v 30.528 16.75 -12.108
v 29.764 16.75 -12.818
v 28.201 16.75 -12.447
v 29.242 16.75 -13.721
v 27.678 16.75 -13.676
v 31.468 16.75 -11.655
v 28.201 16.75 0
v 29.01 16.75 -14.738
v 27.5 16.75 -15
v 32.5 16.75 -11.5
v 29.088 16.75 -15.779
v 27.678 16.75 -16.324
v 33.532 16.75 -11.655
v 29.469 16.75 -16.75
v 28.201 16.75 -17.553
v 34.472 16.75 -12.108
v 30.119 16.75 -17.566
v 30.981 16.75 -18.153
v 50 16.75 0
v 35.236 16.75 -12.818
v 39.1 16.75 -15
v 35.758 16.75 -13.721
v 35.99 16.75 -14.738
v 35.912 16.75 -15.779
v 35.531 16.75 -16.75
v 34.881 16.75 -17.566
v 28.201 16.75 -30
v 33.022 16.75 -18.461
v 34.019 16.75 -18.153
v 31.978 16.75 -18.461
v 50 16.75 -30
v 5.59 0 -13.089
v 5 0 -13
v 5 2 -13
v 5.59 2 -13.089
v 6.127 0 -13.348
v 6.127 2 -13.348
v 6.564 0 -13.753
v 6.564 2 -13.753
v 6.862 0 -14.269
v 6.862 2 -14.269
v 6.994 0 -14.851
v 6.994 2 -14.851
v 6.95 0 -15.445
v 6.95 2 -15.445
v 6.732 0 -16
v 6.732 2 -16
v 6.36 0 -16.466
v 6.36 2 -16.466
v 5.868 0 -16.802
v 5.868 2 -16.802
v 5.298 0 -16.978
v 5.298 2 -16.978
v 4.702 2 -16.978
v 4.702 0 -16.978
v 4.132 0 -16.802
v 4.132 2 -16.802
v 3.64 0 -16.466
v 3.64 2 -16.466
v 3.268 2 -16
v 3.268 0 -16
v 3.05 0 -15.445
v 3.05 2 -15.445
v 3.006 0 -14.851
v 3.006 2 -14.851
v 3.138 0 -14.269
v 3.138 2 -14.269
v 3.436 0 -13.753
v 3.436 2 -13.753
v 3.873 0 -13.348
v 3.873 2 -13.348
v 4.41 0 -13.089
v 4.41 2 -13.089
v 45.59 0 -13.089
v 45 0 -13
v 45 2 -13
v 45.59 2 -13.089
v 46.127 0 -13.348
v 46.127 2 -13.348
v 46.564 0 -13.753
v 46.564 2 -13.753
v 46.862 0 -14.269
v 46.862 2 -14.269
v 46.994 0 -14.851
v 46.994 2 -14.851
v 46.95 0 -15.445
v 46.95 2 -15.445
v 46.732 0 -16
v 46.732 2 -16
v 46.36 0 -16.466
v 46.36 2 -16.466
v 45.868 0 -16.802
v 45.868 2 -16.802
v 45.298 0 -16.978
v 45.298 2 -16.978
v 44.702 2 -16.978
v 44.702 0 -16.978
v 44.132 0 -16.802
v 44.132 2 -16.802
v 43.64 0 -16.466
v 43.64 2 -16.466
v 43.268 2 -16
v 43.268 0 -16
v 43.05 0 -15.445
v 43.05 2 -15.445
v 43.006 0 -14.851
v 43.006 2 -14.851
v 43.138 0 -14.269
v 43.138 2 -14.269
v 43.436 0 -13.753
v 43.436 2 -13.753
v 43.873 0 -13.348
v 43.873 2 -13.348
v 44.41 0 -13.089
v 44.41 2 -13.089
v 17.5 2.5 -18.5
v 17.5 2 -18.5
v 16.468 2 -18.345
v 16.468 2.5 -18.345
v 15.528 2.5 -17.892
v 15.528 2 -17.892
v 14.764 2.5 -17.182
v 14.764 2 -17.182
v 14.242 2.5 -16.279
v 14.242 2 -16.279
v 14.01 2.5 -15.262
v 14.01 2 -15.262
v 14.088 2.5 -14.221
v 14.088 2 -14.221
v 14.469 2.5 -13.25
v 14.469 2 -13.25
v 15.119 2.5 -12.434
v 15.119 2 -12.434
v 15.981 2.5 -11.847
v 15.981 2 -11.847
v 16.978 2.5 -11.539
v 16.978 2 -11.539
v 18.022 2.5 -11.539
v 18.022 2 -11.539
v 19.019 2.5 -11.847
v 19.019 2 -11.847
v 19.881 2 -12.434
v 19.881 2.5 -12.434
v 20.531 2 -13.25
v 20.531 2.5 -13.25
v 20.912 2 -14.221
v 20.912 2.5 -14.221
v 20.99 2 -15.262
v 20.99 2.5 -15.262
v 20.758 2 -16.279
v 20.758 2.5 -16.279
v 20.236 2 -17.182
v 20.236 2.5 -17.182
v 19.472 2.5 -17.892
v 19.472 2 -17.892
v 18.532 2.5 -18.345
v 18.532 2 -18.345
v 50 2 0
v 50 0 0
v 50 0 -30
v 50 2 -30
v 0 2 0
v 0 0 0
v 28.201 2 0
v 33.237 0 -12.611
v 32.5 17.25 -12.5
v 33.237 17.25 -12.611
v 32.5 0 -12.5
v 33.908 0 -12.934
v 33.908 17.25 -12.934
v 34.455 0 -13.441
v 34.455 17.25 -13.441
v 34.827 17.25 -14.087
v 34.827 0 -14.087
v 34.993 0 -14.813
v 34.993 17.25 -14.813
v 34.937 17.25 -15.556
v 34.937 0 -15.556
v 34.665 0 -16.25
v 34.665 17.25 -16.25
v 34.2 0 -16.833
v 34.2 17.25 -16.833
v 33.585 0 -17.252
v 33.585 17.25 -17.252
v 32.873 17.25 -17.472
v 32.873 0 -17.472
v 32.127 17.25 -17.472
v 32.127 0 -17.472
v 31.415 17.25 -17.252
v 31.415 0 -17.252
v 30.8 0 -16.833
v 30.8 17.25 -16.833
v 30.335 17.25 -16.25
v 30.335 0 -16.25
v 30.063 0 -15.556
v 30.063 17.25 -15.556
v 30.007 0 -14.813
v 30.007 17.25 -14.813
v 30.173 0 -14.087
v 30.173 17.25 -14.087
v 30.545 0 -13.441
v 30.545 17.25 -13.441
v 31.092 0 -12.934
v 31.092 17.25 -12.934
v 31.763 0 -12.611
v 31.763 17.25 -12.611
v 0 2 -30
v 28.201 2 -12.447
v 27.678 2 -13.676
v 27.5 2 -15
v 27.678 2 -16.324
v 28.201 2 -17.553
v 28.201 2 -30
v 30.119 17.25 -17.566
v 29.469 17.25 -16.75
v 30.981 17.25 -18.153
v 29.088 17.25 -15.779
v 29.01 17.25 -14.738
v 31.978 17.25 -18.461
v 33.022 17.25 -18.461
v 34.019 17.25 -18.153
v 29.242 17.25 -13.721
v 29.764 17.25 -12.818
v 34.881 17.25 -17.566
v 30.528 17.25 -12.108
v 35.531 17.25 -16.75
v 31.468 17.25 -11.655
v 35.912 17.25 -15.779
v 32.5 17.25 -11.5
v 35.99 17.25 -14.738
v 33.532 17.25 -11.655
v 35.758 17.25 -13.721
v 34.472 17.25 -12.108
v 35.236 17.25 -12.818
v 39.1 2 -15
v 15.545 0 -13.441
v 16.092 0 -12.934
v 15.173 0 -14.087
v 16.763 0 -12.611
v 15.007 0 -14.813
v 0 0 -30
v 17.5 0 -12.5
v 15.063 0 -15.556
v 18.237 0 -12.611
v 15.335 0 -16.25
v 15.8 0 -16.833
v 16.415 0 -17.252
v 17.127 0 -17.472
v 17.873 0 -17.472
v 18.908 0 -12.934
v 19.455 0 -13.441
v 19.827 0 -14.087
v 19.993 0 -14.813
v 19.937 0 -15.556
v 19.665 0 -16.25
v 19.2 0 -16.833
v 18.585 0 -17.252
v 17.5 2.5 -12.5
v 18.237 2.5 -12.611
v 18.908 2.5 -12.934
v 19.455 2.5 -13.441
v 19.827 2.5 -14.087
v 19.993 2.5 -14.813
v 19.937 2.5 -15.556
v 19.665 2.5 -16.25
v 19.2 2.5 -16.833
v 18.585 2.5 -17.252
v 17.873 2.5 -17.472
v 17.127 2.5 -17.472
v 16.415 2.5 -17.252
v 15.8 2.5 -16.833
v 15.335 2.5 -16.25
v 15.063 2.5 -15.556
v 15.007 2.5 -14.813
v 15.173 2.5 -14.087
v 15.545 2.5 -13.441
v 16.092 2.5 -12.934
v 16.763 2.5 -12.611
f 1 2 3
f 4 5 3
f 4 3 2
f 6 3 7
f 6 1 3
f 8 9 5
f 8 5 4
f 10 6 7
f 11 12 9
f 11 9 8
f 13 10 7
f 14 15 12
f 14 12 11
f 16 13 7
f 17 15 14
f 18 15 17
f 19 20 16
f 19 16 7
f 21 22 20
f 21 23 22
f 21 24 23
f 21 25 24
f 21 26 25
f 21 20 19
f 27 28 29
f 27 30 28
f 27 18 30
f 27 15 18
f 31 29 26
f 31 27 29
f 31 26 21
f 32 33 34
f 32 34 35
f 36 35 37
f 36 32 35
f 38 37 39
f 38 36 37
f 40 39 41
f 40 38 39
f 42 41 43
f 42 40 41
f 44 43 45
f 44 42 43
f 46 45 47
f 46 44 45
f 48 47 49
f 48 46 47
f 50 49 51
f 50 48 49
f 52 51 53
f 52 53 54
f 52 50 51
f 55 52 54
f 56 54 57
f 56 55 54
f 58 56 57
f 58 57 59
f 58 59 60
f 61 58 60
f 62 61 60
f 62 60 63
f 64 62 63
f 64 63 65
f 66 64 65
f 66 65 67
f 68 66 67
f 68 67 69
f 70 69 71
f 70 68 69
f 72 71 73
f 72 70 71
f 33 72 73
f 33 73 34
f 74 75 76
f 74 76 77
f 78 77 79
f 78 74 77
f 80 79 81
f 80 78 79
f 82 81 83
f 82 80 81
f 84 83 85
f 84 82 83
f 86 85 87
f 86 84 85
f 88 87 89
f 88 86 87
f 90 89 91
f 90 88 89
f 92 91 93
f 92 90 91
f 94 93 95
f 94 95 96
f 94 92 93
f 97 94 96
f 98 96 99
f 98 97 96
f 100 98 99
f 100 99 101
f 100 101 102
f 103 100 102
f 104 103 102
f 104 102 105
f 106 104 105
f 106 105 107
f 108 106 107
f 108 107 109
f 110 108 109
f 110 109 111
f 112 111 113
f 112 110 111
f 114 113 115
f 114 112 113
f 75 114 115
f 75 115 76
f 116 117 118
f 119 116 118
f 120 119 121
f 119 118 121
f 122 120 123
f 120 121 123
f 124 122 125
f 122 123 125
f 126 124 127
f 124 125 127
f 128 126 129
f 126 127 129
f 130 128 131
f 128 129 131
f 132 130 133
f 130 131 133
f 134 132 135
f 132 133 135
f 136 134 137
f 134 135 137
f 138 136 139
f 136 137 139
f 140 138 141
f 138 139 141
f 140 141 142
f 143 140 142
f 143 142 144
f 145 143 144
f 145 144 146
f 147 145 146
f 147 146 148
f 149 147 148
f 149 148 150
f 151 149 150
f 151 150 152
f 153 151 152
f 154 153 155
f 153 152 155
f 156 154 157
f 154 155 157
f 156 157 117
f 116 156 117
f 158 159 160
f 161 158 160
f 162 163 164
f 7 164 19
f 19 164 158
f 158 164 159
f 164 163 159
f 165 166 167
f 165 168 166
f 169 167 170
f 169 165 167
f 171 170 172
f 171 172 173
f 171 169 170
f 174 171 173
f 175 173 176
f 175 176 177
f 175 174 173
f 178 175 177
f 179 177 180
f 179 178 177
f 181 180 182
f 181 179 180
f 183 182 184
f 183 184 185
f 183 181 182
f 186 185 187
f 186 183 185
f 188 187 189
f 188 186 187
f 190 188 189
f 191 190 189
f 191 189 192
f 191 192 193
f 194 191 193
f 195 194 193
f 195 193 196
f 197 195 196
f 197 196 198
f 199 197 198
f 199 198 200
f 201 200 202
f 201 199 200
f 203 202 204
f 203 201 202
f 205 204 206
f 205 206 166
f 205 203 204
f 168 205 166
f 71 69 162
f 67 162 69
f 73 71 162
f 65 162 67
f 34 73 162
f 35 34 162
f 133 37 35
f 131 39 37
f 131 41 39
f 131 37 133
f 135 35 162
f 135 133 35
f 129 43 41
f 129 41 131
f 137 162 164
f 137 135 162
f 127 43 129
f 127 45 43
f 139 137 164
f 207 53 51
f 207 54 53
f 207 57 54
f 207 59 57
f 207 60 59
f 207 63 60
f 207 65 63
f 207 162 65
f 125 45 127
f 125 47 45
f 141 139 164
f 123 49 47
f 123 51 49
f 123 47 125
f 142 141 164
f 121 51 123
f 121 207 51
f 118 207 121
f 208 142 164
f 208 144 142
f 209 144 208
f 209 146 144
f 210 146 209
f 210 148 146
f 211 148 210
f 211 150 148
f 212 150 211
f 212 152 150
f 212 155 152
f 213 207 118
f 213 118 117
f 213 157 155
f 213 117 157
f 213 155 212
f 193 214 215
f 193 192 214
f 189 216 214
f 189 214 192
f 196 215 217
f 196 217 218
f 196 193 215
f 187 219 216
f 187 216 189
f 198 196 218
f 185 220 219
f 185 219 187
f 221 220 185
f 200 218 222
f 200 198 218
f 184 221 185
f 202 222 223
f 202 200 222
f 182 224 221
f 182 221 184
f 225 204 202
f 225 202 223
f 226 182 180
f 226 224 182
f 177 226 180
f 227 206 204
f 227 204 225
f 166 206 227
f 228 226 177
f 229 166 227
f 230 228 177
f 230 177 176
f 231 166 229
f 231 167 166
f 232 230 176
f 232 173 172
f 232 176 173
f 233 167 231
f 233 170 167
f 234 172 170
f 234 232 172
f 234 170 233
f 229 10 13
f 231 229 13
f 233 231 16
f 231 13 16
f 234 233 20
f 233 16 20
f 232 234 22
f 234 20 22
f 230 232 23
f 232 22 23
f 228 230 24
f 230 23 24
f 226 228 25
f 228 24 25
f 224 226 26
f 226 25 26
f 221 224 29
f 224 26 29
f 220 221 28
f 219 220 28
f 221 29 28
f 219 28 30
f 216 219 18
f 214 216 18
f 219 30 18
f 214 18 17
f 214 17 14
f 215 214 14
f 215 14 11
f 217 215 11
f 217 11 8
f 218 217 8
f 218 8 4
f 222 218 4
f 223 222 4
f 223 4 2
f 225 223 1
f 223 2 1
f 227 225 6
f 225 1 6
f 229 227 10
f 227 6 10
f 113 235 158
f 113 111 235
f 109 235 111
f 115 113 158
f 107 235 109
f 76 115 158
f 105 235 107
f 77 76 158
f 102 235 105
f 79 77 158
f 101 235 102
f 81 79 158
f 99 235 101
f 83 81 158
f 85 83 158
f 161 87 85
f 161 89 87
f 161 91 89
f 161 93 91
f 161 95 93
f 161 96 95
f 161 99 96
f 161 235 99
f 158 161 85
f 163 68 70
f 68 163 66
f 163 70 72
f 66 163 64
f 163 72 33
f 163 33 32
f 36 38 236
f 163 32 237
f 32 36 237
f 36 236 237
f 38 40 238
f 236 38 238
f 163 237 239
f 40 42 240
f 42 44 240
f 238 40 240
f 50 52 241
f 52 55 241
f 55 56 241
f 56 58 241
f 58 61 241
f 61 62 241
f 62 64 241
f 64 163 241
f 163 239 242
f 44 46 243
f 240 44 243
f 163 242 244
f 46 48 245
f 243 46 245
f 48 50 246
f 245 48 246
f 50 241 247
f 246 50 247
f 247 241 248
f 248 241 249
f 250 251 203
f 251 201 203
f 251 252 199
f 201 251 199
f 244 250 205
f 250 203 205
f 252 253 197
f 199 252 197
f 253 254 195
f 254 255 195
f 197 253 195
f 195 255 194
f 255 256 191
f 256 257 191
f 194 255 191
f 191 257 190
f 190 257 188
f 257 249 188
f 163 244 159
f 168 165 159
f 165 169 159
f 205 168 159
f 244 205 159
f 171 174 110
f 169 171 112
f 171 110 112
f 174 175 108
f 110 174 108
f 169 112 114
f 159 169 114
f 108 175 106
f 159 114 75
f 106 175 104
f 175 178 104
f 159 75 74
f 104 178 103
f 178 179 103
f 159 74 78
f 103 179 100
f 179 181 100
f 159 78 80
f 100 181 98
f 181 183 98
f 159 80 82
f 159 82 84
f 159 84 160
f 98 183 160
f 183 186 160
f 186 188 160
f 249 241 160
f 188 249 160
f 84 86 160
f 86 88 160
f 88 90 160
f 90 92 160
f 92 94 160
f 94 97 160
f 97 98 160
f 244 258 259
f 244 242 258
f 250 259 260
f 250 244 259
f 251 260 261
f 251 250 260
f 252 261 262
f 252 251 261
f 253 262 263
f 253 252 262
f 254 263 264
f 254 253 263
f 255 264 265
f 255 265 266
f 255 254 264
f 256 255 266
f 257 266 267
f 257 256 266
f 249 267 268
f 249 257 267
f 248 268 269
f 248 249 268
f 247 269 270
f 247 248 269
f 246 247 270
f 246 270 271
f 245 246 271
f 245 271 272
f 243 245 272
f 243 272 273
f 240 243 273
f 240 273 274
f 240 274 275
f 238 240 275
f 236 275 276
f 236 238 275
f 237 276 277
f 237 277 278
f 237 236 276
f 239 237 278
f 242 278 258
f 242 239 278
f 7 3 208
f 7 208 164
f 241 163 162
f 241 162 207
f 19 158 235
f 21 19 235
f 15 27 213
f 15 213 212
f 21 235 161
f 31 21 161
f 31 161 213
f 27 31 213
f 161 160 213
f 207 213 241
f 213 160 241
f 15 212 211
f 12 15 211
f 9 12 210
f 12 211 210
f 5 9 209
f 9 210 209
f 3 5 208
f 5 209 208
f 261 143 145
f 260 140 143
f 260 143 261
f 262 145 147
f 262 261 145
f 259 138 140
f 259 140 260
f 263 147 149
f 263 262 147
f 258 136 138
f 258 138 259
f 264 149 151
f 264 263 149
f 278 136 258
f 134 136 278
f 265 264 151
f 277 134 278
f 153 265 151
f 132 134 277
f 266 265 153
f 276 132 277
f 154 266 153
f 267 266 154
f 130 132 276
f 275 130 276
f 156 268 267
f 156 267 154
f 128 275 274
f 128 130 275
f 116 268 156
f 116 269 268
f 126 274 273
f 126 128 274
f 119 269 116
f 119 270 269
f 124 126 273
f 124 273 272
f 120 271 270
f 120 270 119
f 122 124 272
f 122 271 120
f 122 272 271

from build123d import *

# Parameters (mm, degrees)
SKETCH1_W           = 50
SKETCH1_H           = 30
SKETCH1_R           = 2
SKETCH1_R_2         = 2.5
BOSS_EXTRUDE1_DEPTH = 2
SKETCH2_R           = 5
SKETCH2_R_2         = 2.5
BOSS_EXTRUDE2_DEPTH = 14.75
SKETCH3_R           = 3.5
SKETCH3_R_2         = 2.5
BOSS_EXTRUDE3_DEPTH = 0.5
SKETCH4_R           = 3.5
SKETCH4_R_2         = 2.5
BOSS_EXTRUDE4_DEPTH = 0.5
BOSS_EXTRUDE5_DEPTH = 14.75


with BuildPart() as part:
    # Sketch1 → Boss-Extrude1 (new body)
    with BuildSketch(Plane(origin=(0, 0, 0), x_dir=(1, 0, 0), z_dir=(0, 1, 0))):
        with Locations((25, 15)):
            Rectangle(SKETCH1_W, SKETCH1_H)
        with Locations(Location((5, 15, 0), (0, 0, 270))):
            Circle(SKETCH1_R, mode=Mode.SUBTRACT)
        with Locations(Location((45, 15, 0), (0, 0, 270))):
            Circle(SKETCH1_R, mode=Mode.SUBTRACT)
        with Locations(Location((17.5, 15, 0), (0, 0, 270))):
            Circle(SKETCH1_R_2, mode=Mode.SUBTRACT)
        with Locations(Location((32.5, 15, 0), (0, 0, 270))):
            Circle(SKETCH1_R_2, mode=Mode.SUBTRACT)
    extrude(amount=BOSS_EXTRUDE1_DEPTH)

    # Sketch2 → Boss-Extrude2 (add)
    with BuildSketch(Plane(origin=(0, 2, 0), x_dir=(1, 0, 0), z_dir=(0, 1, 0))):
        with Locations(Location((32.5, 15, 0), (0, 0, 90))):
            Circle(SKETCH2_R)
        with Locations(Location((32.5, 15, 0), (0, 0, 270))):
            Circle(SKETCH2_R_2, mode=Mode.SUBTRACT)
    extrude(amount=BOSS_EXTRUDE2_DEPTH)

    # Sketch3 → Boss-Extrude3 (add)
    with BuildSketch(Plane(origin=(0, 2, 0), x_dir=(1, 0, 0), z_dir=(0, 1, 0))):
        with Locations(Location((17.5, 15, 0), (0, 0, 90))):
            Circle(SKETCH3_R)
        with Locations(Location((17.5, 15, 0), (0, 0, 270))):
            Circle(SKETCH3_R_2, mode=Mode.SUBTRACT)
    extrude(amount=BOSS_EXTRUDE3_DEPTH)

    # Sketch4 → Boss-Extrude4 (add)
    with BuildSketch(Plane(origin=(0, 16.75, 0), x_dir=(1, 0, 0), z_dir=(0, 1, 0))):
        with Locations(Location((32.5, 15, 0), (0, 0, 270))):
            Circle(SKETCH4_R)
        with Locations(Location((32.5, 15, 0), (0, 0, 270))):
            Circle(SKETCH4_R_2, mode=Mode.SUBTRACT)
    extrude(amount=BOSS_EXTRUDE4_DEPTH)

    # Sketch5 → Boss-Extrude5 (add)
    with BuildSketch(Plane(origin=(0, 2, 0), x_dir=(1, 0, 0), z_dir=(0, 1, 0))):
        with BuildLine():
            Line((50, 30), (28.200775839, 30))
            Line((28.200775839, 30), (28.200775839, 17.552777235))
            ThreePointArc((28.200775839, 17.552777235), (33.823608551, 19.821624249), (37.5, 15))
            ThreePointArc((37.5, 15), (33.823608551, 10.178375751), (28.200775839, 12.447222765))
            Line((28.200775839, 12.447222765), (28.200775839, 0))
            Line((28.200775839, 0), (50, 0))
            Line((50, 0), (39.100387919, 15))
            Line((39.100387919, 15), (50, 30))
        make_face()
    extrude(amount=BOSS_EXTRUDE5_DEPTH)


solid = part.part
